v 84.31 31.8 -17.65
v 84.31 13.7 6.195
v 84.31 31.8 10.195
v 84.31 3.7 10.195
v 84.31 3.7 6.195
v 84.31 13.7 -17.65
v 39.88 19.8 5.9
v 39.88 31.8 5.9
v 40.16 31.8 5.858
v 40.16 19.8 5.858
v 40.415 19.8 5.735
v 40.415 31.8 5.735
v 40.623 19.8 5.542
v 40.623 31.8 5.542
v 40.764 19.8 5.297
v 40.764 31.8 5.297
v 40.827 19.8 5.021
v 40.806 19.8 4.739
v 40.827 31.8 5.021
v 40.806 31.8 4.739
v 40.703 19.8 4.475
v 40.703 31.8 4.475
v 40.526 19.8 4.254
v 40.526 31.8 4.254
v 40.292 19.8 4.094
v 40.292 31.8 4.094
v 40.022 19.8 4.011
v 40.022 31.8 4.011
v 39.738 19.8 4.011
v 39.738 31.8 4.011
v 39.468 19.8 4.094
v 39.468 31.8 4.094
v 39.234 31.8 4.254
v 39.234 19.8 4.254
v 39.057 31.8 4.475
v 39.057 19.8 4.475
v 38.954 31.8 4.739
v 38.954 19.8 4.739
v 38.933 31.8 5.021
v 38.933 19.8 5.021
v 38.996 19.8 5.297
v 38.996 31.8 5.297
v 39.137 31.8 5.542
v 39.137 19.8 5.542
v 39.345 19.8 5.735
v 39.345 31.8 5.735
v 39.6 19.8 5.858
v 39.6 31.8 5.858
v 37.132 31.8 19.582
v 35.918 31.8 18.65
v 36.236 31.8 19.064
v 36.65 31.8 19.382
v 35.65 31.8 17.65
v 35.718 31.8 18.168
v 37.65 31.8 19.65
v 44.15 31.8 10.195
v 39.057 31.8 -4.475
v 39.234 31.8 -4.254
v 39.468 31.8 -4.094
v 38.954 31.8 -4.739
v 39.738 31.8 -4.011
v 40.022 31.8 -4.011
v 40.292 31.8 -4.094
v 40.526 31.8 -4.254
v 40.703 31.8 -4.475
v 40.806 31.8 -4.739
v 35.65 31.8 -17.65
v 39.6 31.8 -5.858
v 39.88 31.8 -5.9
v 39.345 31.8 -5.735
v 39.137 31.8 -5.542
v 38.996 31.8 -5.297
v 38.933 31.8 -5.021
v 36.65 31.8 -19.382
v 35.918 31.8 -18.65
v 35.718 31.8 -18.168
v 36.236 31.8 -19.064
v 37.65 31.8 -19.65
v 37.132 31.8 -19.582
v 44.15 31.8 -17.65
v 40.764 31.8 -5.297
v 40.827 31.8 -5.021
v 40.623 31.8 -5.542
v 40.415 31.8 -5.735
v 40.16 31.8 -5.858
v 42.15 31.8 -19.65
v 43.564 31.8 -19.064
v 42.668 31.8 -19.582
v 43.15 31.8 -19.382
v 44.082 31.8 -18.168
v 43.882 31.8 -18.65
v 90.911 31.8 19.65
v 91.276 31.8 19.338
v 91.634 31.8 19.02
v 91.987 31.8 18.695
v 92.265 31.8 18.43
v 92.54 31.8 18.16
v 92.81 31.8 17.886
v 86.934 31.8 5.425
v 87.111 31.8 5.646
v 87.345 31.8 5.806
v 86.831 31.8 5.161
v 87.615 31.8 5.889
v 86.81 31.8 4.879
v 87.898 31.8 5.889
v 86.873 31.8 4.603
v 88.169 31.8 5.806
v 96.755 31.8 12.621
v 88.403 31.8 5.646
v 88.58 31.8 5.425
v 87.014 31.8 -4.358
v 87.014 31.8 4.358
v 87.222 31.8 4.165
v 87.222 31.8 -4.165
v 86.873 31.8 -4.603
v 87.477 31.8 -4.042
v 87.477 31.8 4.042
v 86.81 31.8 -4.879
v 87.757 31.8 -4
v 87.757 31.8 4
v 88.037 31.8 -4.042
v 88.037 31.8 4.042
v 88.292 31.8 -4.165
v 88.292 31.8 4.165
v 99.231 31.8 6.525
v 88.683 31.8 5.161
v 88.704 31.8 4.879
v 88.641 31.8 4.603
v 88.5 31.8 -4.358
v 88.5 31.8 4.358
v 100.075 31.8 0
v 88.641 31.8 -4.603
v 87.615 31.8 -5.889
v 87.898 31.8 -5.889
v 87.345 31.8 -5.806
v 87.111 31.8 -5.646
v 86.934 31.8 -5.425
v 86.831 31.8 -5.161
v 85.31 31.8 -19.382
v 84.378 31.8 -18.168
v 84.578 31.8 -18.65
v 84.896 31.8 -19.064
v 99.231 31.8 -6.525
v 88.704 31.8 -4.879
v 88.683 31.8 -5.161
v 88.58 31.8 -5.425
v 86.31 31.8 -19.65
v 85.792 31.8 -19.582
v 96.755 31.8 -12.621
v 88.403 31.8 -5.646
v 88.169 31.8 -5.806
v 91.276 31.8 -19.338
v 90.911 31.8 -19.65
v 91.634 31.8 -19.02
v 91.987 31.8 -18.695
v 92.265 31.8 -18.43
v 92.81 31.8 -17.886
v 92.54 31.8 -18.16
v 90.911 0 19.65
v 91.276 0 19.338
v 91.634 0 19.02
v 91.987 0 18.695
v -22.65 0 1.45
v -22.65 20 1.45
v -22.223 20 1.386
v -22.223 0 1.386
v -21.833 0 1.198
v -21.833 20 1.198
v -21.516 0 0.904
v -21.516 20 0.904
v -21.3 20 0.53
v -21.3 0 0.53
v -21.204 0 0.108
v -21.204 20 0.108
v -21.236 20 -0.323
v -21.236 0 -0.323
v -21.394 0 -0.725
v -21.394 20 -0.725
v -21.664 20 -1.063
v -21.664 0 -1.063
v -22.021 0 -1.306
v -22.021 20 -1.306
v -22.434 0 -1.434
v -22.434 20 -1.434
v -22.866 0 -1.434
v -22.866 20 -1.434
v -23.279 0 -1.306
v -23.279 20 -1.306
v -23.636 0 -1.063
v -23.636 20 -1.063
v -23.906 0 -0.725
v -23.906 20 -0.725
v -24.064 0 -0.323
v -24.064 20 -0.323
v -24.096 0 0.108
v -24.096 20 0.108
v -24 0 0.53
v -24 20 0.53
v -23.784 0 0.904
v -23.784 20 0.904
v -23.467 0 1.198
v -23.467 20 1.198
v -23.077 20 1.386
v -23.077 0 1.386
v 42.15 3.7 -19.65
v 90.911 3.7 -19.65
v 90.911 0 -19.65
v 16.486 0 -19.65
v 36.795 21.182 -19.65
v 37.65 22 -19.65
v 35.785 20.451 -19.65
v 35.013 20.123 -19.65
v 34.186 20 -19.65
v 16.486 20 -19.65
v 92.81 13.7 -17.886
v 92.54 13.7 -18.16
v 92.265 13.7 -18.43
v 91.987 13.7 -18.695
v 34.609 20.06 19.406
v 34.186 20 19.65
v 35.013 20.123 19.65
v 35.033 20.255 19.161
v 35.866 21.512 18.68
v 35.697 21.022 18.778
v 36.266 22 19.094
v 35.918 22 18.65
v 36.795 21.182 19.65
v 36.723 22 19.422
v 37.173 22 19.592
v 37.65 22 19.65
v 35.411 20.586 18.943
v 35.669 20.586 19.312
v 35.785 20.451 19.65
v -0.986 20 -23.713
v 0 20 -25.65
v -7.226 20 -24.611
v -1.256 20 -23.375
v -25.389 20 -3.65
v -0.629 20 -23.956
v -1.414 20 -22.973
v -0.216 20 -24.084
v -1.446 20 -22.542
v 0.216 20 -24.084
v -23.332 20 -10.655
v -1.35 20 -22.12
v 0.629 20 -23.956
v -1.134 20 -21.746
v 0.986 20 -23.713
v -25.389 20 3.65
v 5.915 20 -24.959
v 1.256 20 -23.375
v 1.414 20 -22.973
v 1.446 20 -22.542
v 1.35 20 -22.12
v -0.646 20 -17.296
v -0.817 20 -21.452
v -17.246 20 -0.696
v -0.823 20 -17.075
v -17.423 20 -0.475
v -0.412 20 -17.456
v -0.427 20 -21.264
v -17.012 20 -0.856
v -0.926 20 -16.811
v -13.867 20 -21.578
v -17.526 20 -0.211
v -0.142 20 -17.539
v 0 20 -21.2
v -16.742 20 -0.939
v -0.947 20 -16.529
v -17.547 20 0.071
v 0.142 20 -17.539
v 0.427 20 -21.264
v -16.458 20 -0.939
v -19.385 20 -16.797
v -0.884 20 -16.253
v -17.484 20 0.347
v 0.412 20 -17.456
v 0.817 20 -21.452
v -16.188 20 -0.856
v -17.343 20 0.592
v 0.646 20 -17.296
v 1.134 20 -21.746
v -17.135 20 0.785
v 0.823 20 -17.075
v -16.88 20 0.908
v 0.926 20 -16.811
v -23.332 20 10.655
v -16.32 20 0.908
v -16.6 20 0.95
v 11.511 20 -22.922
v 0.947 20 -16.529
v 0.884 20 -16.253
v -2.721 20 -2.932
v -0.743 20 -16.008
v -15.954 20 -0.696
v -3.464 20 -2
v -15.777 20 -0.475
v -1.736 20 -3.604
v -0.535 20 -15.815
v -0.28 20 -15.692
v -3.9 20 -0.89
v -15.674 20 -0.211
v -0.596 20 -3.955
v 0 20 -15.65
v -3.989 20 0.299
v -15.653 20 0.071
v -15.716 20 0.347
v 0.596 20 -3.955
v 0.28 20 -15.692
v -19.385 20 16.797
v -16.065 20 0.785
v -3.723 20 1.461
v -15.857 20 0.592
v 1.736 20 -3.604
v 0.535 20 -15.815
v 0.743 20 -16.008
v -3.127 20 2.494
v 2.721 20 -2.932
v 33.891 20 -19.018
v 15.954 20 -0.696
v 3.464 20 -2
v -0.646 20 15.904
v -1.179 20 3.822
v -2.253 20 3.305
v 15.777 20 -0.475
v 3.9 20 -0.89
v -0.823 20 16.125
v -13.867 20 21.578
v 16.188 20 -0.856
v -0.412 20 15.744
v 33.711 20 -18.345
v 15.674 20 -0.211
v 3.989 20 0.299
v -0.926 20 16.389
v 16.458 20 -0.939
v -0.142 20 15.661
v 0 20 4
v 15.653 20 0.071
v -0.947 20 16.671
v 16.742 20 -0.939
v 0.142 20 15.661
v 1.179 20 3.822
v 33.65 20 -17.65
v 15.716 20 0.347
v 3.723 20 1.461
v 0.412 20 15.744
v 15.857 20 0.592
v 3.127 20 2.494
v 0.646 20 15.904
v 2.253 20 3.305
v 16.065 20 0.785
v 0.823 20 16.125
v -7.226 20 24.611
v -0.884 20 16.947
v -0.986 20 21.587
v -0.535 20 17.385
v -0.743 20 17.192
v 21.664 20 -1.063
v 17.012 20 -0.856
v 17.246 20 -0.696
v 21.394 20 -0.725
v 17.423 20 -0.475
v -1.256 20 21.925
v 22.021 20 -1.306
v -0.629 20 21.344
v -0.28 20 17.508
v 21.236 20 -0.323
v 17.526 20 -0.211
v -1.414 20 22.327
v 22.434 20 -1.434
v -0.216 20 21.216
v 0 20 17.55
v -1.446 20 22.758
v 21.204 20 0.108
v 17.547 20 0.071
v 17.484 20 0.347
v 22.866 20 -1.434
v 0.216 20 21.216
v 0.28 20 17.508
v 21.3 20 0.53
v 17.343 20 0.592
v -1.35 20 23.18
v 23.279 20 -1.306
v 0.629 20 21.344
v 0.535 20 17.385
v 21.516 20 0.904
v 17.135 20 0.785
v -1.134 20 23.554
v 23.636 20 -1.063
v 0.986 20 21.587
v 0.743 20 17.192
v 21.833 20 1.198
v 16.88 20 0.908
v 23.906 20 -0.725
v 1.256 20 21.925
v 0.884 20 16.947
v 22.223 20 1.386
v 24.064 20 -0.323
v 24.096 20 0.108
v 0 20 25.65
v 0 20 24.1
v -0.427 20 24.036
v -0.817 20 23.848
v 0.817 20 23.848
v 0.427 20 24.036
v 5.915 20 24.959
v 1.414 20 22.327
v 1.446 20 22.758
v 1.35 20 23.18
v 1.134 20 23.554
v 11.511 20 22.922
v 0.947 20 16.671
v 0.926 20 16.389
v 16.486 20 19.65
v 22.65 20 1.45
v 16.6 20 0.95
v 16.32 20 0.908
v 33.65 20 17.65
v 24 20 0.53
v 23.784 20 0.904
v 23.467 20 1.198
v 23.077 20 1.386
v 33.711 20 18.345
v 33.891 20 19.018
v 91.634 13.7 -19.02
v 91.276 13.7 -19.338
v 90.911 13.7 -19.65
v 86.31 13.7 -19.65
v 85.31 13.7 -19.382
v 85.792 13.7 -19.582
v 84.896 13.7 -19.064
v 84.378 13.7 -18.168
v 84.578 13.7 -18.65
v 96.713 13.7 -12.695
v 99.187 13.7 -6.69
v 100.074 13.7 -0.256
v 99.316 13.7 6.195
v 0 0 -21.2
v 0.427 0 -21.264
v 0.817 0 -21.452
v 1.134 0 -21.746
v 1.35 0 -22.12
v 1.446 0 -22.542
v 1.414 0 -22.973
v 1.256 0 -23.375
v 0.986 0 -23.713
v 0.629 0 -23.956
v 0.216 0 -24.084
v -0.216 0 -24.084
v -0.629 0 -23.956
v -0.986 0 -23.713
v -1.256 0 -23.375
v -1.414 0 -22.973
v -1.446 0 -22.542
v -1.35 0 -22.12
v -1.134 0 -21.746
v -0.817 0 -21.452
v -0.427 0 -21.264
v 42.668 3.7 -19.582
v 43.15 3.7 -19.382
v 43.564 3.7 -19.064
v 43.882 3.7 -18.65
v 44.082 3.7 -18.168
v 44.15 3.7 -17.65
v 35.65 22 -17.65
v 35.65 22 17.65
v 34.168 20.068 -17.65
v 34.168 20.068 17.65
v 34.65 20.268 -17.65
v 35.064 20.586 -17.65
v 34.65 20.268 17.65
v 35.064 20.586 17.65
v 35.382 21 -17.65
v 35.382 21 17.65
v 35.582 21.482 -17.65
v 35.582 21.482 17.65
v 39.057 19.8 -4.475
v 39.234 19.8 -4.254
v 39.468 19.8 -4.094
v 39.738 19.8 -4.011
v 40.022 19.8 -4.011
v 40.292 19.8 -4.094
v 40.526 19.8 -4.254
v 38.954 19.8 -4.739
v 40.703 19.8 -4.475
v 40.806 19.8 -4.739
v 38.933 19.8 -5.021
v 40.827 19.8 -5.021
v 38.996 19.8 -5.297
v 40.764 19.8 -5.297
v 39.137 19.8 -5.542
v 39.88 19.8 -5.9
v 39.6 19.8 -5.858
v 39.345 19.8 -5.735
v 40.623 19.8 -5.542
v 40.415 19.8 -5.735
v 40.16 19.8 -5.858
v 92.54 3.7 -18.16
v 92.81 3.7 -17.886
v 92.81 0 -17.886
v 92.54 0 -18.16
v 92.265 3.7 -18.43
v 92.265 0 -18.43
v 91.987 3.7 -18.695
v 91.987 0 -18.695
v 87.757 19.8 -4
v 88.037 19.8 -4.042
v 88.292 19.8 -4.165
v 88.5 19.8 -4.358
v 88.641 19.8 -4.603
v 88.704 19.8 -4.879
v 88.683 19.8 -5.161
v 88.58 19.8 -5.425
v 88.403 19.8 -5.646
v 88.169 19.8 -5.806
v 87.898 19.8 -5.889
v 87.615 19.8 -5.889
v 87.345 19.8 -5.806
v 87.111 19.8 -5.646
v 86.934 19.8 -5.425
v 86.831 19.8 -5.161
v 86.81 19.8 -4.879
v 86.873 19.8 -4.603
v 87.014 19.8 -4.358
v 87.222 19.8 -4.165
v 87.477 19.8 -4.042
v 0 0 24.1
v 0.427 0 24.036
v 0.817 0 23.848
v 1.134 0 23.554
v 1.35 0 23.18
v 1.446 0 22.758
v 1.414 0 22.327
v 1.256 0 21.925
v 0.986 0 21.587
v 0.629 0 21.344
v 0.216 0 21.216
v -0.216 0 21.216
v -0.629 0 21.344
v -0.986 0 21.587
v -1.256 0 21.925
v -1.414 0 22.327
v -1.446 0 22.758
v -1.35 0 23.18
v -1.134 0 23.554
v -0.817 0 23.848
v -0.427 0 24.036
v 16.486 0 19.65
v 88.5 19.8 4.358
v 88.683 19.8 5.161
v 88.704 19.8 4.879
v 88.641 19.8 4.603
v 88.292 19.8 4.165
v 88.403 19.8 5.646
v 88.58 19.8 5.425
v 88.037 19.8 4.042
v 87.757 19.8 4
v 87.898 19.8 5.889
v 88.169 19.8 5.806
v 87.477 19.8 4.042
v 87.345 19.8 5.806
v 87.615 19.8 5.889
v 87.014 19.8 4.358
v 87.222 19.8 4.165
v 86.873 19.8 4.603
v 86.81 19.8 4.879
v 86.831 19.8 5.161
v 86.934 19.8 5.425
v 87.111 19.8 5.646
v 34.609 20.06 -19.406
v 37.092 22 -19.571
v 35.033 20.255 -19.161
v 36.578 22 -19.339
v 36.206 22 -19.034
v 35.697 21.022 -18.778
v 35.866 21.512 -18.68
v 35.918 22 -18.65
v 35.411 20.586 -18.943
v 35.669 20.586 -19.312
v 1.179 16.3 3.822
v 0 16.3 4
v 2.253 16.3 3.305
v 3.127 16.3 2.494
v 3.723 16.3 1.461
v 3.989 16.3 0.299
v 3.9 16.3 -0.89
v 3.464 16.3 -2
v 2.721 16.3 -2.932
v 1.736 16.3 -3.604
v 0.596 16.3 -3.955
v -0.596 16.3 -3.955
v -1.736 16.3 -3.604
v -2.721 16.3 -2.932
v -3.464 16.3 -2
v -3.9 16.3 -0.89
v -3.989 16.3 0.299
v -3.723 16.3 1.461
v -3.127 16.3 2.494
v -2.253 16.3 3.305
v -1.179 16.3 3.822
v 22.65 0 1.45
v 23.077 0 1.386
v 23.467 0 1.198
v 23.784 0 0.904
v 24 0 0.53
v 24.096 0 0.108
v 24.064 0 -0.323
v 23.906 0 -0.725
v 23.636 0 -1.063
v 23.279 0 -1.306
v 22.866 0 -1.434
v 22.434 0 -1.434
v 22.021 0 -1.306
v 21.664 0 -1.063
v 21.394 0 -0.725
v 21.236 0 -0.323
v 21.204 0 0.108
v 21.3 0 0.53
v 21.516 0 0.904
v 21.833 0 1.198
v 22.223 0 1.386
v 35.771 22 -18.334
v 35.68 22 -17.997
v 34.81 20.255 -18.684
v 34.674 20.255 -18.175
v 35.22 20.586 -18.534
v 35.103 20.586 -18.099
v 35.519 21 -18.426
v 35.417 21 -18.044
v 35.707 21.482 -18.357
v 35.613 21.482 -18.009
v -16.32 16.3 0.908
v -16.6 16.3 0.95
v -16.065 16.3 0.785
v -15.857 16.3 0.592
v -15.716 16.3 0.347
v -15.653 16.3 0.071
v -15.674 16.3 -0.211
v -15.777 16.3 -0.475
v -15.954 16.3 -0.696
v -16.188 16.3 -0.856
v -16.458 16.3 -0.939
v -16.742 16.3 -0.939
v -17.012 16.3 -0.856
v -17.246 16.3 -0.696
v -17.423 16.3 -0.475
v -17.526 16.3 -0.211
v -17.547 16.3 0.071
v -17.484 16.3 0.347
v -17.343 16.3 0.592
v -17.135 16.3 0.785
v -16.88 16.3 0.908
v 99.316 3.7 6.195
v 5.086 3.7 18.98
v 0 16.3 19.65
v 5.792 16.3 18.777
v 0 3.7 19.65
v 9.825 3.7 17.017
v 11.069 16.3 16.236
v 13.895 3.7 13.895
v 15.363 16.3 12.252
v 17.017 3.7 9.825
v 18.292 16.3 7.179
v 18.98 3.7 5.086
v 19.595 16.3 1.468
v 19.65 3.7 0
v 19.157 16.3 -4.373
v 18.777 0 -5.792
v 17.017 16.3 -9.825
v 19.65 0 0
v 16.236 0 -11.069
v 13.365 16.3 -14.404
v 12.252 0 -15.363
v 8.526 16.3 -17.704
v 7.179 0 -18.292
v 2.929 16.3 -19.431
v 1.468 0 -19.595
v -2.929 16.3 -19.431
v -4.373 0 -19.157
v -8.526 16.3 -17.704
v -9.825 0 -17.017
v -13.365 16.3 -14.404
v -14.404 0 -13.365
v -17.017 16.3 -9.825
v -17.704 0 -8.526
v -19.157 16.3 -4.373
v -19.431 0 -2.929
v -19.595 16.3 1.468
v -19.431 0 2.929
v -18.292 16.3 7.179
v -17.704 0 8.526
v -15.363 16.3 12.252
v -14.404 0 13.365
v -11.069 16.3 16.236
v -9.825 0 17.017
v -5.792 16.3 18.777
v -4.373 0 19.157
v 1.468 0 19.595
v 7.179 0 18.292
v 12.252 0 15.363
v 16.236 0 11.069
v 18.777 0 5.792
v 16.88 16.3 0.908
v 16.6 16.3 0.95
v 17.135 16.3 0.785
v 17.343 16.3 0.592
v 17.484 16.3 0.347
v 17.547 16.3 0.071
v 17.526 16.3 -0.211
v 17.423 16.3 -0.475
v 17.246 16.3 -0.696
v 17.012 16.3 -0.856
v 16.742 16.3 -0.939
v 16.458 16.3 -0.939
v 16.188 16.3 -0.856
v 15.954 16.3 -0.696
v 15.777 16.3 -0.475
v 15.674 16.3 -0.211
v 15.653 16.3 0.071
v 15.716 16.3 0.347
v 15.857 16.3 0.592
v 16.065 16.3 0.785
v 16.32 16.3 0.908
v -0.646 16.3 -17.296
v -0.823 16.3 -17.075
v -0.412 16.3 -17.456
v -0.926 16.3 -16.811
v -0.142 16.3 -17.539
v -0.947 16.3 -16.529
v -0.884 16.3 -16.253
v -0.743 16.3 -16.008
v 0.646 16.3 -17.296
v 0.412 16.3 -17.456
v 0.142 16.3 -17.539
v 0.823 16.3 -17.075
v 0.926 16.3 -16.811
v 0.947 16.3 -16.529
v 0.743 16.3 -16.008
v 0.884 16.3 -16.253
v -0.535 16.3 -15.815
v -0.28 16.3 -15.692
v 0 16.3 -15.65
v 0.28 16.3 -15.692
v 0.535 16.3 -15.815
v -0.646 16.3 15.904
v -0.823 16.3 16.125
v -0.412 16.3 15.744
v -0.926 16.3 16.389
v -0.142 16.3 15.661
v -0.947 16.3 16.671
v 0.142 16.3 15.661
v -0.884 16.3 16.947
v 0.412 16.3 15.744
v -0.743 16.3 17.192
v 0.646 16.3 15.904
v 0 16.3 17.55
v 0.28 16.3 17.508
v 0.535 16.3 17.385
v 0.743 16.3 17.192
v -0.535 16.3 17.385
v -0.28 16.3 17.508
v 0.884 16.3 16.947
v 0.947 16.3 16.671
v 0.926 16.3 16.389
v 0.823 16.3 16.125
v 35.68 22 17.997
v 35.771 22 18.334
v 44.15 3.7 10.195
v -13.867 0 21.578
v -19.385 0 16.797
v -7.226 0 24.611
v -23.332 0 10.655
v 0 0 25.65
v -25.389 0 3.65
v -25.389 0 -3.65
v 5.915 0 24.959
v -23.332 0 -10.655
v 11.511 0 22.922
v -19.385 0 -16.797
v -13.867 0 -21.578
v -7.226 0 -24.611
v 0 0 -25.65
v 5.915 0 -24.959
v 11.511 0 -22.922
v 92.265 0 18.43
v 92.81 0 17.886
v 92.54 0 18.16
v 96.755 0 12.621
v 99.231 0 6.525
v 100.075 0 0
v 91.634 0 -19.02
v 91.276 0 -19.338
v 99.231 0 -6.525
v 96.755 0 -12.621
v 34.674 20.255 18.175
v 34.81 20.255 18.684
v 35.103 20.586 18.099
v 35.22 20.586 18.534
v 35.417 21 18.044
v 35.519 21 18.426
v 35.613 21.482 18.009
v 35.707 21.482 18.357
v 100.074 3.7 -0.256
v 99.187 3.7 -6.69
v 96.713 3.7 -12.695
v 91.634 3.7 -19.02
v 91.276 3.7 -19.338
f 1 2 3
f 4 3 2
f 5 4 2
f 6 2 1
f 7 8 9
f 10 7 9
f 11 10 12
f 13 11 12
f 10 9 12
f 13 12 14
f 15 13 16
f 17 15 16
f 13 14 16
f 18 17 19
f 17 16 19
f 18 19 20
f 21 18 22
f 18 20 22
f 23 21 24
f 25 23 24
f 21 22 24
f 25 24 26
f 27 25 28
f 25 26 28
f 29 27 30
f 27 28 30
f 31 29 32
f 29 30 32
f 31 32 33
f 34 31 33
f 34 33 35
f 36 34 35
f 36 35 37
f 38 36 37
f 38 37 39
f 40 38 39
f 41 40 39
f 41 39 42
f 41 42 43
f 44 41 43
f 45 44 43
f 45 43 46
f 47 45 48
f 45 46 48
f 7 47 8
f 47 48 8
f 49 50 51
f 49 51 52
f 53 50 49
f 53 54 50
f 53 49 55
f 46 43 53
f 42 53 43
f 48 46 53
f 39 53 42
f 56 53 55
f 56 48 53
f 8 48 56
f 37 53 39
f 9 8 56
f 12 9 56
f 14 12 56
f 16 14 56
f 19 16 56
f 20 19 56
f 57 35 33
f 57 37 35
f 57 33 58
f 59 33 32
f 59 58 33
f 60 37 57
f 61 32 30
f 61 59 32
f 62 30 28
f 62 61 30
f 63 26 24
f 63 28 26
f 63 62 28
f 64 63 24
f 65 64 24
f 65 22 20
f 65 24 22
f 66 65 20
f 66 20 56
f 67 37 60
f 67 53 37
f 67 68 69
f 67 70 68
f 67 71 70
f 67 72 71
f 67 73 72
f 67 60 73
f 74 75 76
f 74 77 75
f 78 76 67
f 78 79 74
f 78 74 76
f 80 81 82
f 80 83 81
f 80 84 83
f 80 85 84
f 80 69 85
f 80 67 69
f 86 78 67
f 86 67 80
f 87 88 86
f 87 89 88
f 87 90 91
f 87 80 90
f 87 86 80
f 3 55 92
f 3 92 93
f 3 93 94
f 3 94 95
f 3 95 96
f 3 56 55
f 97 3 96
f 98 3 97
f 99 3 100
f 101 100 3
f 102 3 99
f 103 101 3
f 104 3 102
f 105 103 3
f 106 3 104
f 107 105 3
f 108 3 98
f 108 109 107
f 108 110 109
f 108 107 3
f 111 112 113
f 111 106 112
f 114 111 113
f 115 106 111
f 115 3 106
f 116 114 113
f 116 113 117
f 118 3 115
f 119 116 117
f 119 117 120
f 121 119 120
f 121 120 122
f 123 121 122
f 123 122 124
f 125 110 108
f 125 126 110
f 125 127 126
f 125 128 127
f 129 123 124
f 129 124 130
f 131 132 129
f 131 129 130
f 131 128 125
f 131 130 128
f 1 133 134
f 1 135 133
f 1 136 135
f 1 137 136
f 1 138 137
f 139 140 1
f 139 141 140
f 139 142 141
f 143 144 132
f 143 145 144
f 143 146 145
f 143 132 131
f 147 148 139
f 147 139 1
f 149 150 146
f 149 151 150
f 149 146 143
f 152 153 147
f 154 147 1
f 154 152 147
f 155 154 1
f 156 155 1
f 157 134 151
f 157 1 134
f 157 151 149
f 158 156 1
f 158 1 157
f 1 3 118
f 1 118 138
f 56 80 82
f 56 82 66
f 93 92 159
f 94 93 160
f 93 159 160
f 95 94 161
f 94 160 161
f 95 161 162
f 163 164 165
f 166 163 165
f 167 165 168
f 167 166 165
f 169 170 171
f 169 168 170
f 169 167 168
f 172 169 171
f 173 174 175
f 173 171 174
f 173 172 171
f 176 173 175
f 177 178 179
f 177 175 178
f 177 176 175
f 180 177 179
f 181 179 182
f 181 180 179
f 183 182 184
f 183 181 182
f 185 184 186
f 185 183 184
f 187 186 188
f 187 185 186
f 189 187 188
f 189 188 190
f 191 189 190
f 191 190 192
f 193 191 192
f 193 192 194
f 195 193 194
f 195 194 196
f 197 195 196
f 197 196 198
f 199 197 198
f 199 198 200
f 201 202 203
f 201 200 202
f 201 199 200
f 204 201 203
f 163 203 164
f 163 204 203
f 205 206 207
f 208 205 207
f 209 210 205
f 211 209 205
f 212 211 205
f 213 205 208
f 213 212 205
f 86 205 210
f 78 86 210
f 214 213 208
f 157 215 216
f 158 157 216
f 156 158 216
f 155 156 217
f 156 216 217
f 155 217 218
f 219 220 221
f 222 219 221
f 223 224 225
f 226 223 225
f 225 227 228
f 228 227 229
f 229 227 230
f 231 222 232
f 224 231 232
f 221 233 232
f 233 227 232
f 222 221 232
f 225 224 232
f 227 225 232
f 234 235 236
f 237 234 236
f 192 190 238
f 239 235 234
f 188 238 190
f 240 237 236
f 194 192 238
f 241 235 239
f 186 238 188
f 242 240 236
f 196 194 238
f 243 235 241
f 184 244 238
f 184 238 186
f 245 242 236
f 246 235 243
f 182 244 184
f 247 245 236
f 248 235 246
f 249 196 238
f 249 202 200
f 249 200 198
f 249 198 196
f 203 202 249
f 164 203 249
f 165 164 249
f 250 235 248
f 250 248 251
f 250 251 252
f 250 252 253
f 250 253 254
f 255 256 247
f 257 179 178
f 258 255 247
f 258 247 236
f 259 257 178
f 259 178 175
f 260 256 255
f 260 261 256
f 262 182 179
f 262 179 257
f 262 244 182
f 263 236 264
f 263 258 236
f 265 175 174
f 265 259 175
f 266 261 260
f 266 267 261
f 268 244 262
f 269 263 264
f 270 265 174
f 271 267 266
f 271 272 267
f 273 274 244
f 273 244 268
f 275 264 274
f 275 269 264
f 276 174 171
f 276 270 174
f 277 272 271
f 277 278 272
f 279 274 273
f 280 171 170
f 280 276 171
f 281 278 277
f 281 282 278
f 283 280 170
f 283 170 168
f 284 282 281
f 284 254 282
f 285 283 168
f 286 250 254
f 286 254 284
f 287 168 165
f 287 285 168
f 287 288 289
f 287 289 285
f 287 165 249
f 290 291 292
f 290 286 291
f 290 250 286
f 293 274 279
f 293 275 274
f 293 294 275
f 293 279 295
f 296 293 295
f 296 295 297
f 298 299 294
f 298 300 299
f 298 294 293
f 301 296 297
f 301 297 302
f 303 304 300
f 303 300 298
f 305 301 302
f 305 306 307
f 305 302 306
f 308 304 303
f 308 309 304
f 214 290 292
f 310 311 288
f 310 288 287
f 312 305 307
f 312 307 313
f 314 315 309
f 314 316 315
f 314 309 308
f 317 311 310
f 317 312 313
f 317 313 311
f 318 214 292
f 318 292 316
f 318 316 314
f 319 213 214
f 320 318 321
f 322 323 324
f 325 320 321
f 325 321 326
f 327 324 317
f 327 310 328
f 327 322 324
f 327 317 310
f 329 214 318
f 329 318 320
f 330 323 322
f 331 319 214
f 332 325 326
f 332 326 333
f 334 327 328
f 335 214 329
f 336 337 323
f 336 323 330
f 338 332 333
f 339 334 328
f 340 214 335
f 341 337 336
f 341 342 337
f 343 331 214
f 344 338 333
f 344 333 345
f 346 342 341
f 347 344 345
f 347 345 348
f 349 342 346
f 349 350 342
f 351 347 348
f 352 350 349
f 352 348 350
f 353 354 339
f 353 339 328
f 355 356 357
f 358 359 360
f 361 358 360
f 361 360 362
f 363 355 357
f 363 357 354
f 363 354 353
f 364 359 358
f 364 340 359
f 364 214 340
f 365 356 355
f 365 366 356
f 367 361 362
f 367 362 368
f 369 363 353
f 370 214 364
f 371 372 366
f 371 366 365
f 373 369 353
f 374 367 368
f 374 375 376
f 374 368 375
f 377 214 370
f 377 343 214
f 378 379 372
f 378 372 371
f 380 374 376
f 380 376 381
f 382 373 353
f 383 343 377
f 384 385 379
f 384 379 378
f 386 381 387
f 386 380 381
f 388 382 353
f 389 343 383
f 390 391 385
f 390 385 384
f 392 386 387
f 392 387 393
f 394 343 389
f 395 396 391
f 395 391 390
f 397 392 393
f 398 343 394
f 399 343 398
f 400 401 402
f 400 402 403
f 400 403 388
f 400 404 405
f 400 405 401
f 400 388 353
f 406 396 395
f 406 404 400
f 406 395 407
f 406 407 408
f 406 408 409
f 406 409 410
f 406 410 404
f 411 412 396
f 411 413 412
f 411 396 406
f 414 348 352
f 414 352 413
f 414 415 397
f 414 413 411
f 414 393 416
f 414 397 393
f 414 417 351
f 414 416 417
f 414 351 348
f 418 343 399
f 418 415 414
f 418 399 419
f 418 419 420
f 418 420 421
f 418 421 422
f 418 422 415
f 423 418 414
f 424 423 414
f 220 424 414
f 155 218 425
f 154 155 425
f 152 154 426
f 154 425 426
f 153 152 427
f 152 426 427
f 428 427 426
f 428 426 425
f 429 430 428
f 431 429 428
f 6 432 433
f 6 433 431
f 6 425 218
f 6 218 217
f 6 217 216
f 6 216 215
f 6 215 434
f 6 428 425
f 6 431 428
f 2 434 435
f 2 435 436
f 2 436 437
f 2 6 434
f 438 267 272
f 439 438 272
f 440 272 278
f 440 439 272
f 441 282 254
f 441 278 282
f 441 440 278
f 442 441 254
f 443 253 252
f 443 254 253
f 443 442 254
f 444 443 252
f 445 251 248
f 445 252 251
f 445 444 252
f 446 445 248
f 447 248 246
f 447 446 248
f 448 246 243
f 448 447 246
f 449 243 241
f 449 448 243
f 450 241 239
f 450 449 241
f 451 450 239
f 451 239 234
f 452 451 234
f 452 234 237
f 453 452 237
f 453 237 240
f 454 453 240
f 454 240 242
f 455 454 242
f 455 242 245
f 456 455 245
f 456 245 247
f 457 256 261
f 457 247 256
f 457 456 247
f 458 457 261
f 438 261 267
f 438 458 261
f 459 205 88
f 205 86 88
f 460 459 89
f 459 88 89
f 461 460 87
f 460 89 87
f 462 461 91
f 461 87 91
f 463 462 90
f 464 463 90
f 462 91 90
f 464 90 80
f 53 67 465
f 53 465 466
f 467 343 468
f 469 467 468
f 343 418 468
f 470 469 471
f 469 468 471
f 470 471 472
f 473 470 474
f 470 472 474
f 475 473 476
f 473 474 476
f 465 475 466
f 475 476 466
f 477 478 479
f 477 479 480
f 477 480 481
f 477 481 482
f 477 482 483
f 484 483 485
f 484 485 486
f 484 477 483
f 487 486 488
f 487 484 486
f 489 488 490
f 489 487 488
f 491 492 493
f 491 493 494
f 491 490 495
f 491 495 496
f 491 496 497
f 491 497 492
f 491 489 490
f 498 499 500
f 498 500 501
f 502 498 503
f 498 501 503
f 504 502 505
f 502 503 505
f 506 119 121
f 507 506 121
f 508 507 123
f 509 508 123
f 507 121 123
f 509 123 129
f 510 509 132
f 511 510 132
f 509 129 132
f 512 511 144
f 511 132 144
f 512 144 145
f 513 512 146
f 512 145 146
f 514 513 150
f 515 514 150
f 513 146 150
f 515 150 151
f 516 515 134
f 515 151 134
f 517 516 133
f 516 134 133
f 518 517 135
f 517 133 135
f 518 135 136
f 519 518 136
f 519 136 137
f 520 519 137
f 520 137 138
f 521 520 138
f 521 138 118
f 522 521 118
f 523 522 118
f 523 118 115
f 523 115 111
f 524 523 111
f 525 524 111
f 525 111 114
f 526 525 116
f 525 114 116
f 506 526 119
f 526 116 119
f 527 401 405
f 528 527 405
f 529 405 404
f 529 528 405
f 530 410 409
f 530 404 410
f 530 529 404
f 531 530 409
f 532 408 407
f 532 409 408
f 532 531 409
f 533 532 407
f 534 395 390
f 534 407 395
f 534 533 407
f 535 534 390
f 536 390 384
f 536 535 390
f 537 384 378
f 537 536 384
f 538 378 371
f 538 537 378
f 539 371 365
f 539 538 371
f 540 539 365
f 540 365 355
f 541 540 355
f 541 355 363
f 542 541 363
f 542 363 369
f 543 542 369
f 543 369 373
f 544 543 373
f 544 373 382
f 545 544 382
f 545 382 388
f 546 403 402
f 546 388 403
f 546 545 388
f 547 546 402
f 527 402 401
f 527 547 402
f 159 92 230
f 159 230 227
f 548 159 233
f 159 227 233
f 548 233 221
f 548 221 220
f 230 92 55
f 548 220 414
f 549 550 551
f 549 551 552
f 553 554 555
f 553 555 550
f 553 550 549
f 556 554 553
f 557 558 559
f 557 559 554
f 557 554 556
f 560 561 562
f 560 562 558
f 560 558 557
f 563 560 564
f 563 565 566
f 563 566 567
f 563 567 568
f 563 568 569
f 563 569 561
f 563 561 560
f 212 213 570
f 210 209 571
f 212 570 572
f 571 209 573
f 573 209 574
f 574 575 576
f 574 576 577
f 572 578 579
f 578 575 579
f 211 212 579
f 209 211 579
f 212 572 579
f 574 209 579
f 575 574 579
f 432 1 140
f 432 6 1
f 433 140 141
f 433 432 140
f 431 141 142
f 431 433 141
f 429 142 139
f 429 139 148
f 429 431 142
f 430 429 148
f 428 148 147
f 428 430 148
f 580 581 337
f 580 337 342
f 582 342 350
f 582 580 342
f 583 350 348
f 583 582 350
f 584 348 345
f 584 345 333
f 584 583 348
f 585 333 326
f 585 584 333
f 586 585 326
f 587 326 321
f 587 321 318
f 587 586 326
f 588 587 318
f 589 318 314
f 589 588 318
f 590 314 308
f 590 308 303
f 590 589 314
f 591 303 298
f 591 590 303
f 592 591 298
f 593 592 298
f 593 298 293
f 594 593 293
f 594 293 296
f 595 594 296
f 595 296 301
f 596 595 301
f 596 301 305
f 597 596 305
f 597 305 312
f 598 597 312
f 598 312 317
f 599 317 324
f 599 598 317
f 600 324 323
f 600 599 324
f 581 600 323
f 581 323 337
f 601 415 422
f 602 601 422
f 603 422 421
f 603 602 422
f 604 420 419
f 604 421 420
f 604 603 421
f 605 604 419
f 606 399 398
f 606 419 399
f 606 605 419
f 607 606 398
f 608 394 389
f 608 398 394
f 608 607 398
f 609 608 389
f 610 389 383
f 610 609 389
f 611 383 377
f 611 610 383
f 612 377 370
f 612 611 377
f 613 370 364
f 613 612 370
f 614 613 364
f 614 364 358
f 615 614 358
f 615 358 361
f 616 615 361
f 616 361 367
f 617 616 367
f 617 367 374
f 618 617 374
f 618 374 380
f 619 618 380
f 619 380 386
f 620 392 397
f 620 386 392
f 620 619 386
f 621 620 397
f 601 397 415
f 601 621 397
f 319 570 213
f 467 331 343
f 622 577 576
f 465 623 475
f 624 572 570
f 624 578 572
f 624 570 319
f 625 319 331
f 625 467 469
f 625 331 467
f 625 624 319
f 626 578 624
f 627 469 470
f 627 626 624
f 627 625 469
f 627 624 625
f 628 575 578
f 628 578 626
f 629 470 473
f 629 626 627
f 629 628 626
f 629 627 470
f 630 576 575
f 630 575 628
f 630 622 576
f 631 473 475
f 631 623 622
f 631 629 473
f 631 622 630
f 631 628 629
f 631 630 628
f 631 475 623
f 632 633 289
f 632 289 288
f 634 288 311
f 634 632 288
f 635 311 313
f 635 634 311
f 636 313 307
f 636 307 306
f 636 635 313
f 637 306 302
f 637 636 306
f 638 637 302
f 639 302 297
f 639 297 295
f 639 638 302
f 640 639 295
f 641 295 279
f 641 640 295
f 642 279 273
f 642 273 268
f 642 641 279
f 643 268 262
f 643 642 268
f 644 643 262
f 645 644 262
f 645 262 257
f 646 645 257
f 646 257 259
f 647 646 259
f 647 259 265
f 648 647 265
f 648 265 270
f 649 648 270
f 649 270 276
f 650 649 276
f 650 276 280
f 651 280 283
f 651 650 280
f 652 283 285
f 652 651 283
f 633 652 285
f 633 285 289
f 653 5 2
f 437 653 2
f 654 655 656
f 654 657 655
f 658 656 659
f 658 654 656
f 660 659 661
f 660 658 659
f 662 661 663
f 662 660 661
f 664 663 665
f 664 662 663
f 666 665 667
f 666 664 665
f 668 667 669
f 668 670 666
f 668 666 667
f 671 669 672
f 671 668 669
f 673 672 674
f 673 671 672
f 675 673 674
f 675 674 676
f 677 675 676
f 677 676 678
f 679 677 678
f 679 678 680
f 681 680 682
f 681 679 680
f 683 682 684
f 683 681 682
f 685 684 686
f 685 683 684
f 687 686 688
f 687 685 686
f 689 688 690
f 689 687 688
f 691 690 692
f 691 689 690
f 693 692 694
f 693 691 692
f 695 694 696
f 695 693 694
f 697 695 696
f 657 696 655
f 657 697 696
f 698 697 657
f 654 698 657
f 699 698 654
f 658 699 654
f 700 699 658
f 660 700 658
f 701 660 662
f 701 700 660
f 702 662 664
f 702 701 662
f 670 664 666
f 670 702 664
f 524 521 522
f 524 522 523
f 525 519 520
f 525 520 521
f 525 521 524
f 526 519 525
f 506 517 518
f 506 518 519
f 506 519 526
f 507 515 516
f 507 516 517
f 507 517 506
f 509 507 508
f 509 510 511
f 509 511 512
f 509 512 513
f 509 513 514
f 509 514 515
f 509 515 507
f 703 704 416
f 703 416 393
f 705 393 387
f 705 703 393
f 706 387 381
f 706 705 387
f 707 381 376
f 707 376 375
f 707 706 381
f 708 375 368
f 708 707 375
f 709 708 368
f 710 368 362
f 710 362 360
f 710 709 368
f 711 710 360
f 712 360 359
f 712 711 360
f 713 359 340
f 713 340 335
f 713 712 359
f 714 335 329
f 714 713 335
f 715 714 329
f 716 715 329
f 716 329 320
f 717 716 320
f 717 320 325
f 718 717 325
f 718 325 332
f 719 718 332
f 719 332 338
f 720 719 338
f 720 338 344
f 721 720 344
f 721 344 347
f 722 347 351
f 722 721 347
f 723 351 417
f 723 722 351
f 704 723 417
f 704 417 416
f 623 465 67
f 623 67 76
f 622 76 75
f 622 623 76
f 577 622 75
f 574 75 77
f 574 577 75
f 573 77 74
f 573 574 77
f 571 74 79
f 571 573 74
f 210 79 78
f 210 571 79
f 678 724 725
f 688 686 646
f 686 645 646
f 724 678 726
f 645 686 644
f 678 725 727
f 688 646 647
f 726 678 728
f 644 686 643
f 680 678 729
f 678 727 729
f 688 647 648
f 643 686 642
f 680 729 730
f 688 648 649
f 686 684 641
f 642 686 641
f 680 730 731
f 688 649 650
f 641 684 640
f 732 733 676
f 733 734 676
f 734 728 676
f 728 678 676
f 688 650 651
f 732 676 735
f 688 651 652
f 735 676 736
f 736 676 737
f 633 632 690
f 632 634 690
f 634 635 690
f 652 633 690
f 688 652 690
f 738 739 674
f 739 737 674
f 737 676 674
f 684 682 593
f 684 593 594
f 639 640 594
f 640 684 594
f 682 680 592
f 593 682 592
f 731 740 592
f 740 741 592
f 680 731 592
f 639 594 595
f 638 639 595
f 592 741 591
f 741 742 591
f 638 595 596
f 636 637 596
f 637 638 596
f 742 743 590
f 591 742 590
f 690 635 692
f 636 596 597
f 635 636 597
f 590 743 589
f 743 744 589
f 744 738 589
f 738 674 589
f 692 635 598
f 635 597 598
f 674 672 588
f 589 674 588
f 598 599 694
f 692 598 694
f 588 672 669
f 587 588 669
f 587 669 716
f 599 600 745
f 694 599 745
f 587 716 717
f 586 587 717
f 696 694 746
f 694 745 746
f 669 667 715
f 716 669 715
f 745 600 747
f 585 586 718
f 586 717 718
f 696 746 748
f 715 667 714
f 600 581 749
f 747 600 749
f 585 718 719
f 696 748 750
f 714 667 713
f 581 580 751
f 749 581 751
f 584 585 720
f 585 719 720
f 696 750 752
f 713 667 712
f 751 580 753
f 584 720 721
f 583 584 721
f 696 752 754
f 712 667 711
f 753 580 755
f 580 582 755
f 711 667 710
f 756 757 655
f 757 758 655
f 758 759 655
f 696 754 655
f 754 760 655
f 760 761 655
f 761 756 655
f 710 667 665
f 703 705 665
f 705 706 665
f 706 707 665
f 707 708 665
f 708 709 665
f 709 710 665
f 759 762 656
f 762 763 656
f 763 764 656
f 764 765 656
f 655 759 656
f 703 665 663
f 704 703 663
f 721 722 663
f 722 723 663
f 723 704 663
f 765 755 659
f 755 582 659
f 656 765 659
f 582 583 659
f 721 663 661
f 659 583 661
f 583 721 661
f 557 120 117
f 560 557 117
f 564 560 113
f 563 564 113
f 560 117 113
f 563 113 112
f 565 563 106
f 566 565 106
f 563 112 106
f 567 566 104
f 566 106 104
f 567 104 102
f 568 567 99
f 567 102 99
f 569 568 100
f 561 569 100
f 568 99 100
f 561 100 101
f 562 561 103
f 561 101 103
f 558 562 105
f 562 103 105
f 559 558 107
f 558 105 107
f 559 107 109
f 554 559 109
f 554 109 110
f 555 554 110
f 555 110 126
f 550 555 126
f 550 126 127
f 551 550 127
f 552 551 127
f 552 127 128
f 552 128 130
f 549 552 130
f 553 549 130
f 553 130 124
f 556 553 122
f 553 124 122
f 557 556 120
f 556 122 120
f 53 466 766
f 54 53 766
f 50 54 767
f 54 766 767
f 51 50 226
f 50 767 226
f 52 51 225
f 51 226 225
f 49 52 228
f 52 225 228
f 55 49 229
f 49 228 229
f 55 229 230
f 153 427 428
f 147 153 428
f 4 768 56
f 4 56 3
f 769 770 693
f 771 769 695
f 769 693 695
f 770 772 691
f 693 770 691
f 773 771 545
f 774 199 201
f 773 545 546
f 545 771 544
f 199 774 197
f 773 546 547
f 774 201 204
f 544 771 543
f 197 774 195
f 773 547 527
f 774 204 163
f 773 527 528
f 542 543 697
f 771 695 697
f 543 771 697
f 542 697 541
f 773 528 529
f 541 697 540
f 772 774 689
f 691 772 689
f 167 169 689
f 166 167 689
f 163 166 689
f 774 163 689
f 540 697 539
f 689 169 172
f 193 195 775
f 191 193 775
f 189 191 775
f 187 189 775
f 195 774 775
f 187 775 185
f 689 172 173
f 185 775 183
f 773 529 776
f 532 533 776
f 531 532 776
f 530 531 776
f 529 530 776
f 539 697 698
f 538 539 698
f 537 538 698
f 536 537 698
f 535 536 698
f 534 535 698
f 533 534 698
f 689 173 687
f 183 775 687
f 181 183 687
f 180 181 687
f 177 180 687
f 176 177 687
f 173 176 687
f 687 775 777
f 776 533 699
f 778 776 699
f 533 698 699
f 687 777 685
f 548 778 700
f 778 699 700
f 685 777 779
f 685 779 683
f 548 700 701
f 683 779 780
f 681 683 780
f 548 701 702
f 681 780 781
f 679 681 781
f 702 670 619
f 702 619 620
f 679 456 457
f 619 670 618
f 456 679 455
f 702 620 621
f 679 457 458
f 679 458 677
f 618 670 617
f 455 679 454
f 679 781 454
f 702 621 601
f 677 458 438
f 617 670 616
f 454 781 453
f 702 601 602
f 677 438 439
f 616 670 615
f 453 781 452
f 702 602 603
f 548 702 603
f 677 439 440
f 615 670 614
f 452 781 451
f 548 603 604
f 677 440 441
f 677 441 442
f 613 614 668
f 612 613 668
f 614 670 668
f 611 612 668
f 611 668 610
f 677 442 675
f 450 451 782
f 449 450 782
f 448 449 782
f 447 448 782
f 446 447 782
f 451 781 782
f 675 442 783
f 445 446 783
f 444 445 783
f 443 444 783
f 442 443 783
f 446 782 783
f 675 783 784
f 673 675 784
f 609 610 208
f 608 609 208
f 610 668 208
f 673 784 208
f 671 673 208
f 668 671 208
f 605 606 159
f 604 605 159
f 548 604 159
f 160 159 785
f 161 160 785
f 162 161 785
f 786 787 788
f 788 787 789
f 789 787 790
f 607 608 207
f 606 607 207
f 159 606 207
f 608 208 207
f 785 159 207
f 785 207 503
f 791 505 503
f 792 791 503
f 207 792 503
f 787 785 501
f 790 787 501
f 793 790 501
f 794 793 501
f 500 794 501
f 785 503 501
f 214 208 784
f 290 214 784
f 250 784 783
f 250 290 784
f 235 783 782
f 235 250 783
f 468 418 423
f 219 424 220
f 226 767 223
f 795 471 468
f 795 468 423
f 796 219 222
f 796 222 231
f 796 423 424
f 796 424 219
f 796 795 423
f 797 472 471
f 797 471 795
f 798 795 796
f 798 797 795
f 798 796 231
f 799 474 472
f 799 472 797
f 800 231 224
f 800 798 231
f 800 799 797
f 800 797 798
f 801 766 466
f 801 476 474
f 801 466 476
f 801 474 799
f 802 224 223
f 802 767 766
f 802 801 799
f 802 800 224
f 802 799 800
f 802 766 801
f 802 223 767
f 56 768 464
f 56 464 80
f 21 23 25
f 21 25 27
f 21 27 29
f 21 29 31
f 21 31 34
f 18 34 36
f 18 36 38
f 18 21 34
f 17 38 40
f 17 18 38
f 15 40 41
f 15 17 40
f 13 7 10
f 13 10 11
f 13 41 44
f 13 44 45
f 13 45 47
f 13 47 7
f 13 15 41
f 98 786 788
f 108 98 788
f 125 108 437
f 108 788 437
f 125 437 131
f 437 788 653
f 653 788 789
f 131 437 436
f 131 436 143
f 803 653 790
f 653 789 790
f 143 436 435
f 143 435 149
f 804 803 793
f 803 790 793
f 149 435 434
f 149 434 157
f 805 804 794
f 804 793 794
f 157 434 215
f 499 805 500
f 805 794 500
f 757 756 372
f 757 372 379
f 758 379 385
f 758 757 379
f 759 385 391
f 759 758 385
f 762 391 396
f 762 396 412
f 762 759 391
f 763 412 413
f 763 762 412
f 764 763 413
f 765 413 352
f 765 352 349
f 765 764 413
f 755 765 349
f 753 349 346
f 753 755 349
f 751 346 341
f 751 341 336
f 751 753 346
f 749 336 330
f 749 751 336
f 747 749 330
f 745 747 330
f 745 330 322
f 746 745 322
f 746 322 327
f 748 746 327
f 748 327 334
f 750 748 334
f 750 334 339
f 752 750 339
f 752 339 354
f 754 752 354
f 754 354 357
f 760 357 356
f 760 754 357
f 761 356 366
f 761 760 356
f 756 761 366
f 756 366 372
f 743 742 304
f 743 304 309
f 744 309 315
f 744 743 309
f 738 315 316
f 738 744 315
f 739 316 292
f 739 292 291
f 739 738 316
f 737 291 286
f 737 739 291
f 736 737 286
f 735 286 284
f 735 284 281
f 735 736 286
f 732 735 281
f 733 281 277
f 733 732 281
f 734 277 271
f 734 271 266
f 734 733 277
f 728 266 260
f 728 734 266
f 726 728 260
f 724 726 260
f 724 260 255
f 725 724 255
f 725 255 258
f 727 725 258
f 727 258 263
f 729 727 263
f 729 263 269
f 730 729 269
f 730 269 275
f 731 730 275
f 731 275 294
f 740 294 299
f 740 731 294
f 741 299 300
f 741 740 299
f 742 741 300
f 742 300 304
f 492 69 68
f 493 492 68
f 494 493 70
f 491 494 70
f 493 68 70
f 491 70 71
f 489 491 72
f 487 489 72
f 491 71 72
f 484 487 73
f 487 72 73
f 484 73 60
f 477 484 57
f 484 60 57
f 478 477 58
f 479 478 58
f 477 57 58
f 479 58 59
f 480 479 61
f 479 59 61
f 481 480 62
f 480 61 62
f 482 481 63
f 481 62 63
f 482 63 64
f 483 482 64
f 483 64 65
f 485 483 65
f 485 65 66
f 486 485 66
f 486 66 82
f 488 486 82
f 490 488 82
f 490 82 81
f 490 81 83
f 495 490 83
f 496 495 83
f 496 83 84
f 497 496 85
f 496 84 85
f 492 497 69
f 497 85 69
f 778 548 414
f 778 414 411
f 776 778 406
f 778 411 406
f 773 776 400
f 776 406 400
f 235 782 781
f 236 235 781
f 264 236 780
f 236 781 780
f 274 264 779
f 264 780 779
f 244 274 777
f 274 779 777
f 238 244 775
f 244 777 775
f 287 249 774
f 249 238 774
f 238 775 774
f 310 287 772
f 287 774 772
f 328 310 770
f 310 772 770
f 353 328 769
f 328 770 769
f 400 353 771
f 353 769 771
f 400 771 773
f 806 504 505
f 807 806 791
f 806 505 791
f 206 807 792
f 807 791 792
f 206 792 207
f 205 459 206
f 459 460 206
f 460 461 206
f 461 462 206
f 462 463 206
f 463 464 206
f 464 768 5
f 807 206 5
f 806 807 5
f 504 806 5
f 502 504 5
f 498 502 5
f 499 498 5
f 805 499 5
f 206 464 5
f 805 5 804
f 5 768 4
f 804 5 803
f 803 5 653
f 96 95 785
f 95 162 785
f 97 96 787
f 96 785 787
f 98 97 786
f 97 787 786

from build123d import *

# Parameters (mm, degrees)
SKETCH1_R                = 25.65
SKETCH1_R_2              = 19.65
SKETCH1_R_3              = 4
SKETCH1_R_4              = 0.95
SKETCH1_W                = 40.16
SKETCH1_H                = 20.39
BOSS_EXTRUDE2_DEPTH      = 3.7
SKETCH5_R                = 19.65
SKETCH5_W                = 40.16
SKETCH5_H                = 20.39
BOSS_EXTRUDE3_DEPTH      = 28.1
CUT_EXTRUDE1_REACH       = 112.955
SKETCH6_W                = 40.16
SKETCH6_H                = 28.1
CUT_EXTRUDE2_REACH       = 119.305
CUT_EXTRUDE2_END_RADIUS  = 25.65
SKETCH7_W                = 29.863740461
SKETCH7_H                = 10
CUT_EXTRUDE3_DEPTH       = 109.093330622
CUT_EXTRUDE3_DEPTH_BACK  = 109.093330622
SKETCH8_R                = 1.45
SKETCH9_R                = 0.95
CUT_EXTRUDE4_DEPTH       = 12
CUT_EXTRUDE5_DEPTH       = 109.093330622
FILLET1_R                = 2
CUT_EXTRUDE6_DEPTH       = 11.8
BOSS_EXTRUDE4_START      = -3.7
SKETCH14_R               = 19.65
SKETCH14_R_2             = 0.95
SKETCH14_R_3             = 4
BOSS_EXTRUDE4_DEPTH      = 3.7
CUT_EXTRUDE7_START       = -3.7
CUT_EXTRUDE7_OUTLINE_R   = 19.65
CUT_EXTRUDE7_OUTLINE_R_2 = 0.95
CUT_EXTRUDE7_OUTLINE_R_3 = 4
CUT_EXTRUDE7_DEPTH       = 3.7
FILLET2_R                = 2
FILLET3_R                = 2


# Read off the part's stored shape, not the designer's step: Cut-Extrude7
with BuildPart() as part:
    # Sketch1 → Boss-Extrude2 (new body)
    # profile 1 of 6: a face of its own
    with BuildSketch(Plane(origin=(0, 0, 0), x_dir=(1, 0, 0), z_dir=(0, 1, 0))):
        Circle(SKETCH1_R)
        Circle(SKETCH1_R_2, mode=Mode.SUBTRACT)
    # profile 2 of 6: a face of its own
    with BuildSketch(Plane(origin=(0, 0, 0), x_dir=(1, 0, 0), z_dir=(0, 1, 0))):
        Circle(SKETCH1_R_2)
        with Locations(Location((0, 0, 0), (0, 0, 270))):
            Circle(SKETCH1_R_3, mode=Mode.SUBTRACT)
        with Locations(Location((16.6, 0, 0), (0, 0, 270))):
            Circle(SKETCH1_R_4, mode=Mode.SUBTRACT)
        with Locations(Location((0, -16.6, 0), (0, 0, 270))):
            Circle(SKETCH1_R_4, mode=Mode.SUBTRACT)
        with Locations(Location((-16.6, 0, 0), (0, 0, 270))):
            Circle(SKETCH1_R_4, mode=Mode.SUBTRACT)
        with Locations(Location((0, 16.6, 0), (0, 0, 270))):
            Circle(SKETCH1_R_4, mode=Mode.SUBTRACT)
    # profile 3 of 6: a face of its own
    with BuildSketch(Plane(origin=(0, 0, 0), x_dir=(1, 0, 0), z_dir=(0, 1, 0))):
        with BuildLine():
            Line((35.65, 18.695), (91.986875612, 18.695))
            ThreePointArc((91.986875612, 18.695), (83.869462663, 23.847948025), (74.425, 25.65))
            Line((74.425, 25.65), (0, 25.65))
            ThreePointArc((0, 25.65), (18.137288937, 18.137288937), (25.65, 0))
            ThreePointArc((25.65, 0), (18.137288937, -18.137288937), (0, -25.65))
            Line((0, -25.65), (74.425, -25.65))
            ThreePointArc((74.425, -25.65), (83.869462663, -23.847948025), (91.986875612, -18.695))
            Line((91.986875612, -18.695), (35.65, -18.695))
            Line((35.65, -18.695), (35.65, 18.695))
        make_face()
    # profile 4 of 6: a face of its own
    with BuildSketch(Plane(origin=(0, 0, 0), x_dir=(1, 0, 0), z_dir=(0, 1, 0))):
        with BuildLine():
            Line((92.81, -17.886147573), (92.81, 17.886147573))
            ThreePointArc((92.81, 17.886147573), (92.402987293, 18.295203548), (91.986875612, 18.695))
            Line((91.986875612, 18.695), (35.65, 18.695))
            Line((35.65, 18.695), (35.65, -18.695))
            Line((35.65, -18.695), (91.986875612, -18.695))
            ThreePointArc((91.986875612, -18.695), (92.402987293, -18.295203548), (92.81, -17.886147573))
        make_face()
        with Locations((64.23, 0)):
            Rectangle(SKETCH1_W, SKETCH1_H, mode=Mode.SUBTRACT)
    # profile 5 of 6: a face of its own
    with BuildSketch(Plane(origin=(0, 0, 0), x_dir=(1, 0, 0), z_dir=(0, 1, 0))):
        with Locations((64.23, 0)):
            Rectangle(SKETCH1_W, SKETCH1_H)
    # profile 6 of 6: a face of its own
    with BuildSketch(Plane(origin=(0, 0, 0), x_dir=(1, 0, 0), z_dir=(0, 1, 0))):
        with BuildLine():
            ThreePointArc((92.81, -17.886147573), (100.075, 0), (92.81, 17.886147573))
            Line((92.81, 17.886147573), (92.81, -17.886147573))
        make_face()
    extrude(amount=BOSS_EXTRUDE2_DEPTH)

    # Sketch5 → Boss-Extrude3 (add)
    # profile 1 of 4: a face of its own
    with BuildSketch(Plane(origin=(0, 3.7, 0), x_dir=(1, 0, 0), z_dir=(0, 1, 0))):
        with BuildLine():
            ThreePointArc((25.65, 0), (18.137288937, 18.137288937), (0, 25.65))
            ThreePointArc((0, 25.65), (-25.65, 0), (0, -25.65))
            ThreePointArc((0, -25.65), (18.137288937, -18.137288937), (25.65, 0))
        make_face()
        with Locations(Location((0, 0, 0), (0, 0, 270))):
            Circle(SKETCH5_R, mode=Mode.SUBTRACT)
    # profile 2 of 4: a face of its own
    with BuildSketch(Plane(origin=(0, 3.7, 0), x_dir=(1, 0, 0), z_dir=(0, 1, 0))):
        with BuildLine():
            ThreePointArc((92.81, 17.886147573), (92.402987293, 18.295203548), (91.986875612, 18.695))
            Line((91.986875612, 18.695), (35.65, 18.695))
            Line((35.65, 18.695), (35.65, -18.695))
            Line((35.65, -18.695), (91.986875612, -18.695))
            ThreePointArc((91.986875612, -18.695), (92.402987293, -18.295203548), (92.81, -17.886147573))
            Line((92.81, -17.886147573), (92.81, 17.886147573))
        make_face()
        with Locations((64.23, 0)):
            Rectangle(SKETCH5_W, SKETCH5_H, mode=Mode.SUBTRACT)
    # profile 3 of 4: a face of its own
    with BuildSketch(Plane(origin=(0, 3.7, 0), x_dir=(1, 0, 0), z_dir=(0, 1, 0))):
        with BuildLine():
            ThreePointArc((91.986875612, 18.695), (83.869462663, 23.847948025), (74.425, 25.65))
            Line((74.425, 25.65), (0, 25.65))
            ThreePointArc((0, 25.65), (18.137288937, 18.137288937), (25.65, 0))
            ThreePointArc((25.65, 0), (18.137288937, -18.137288937), (0, -25.65))
            Line((0, -25.65), (74.425, -25.65))
            ThreePointArc((74.425, -25.65), (83.869462663, -23.847948025), (91.986875612, -18.695))
            Line((91.986875612, -18.695), (35.65, -18.695))
            Line((35.65, -18.695), (35.65, 18.695))
            Line((35.65, 18.695), (91.986875612, 18.695))
        make_face()
    # profile 4 of 4: a face of its own
    with BuildSketch(Plane(origin=(0, 3.7, 0), x_dir=(1, 0, 0), z_dir=(0, 1, 0))):
        with BuildLine():
            ThreePointArc((92.81, -17.886147573), (100.075, 0), (92.81, 17.886147573))
            Line((92.81, 17.886147573), (92.81, -17.886147573))
        make_face()
    extrude(amount=BOSS_EXTRUDE3_DEPTH)

    # Sketch6 → Cut-Extrude1 (cut, up to next)
    with BuildSketch(Plane.XY.offset(-10.195), mode=Mode.PRIVATE) as cut_extrude1_sk1:
        with Locations((64.23, 17.75)):
            Rectangle(SKETCH6_W, SKETCH6_H)
    cut_extrude1_tool1 = extrude(cut_extrude1_sk1.sketch, amount=-CUT_EXTRUDE1_REACH, mode=Mode.PRIVATE) & part.part
    add(cut_extrude1_tool1.solids().sort_by_distance((64.23, 17.75, -10.195))[0], mode=Mode.SUBTRACT)

    # Cut-Extrude2: up to this cylinder (the profile starts inside it)
    cut_extrude2_end = Plane(origin=(74.425, 8.7, 0), z_dir=(0, -1, 0)) * Cylinder(CUT_EXTRUDE2_END_RADIUS, 290.91, mode=Mode.PRIVATE)
    # Sketch7 → Cut-Extrude2 (cut, up to the surface)
    with BuildSketch(Plane.ZY.offset(-84.31), mode=Mode.PRIVATE) as cut_extrude2_sk1:
        with Locations((-8.736870231, 8.7)):
            Rectangle(SKETCH7_W, SKETCH7_H)
    cut_extrude2_tool1 = extrude(cut_extrude2_sk1.sketch, amount=-CUT_EXTRUDE2_REACH, mode=Mode.PRIVATE) & cut_extrude2_end
    add(cut_extrude2_tool1.solids().sort_by_distance((84.31, 8.7, -8.73687))[0], mode=Mode.SUBTRACT)

    # Sketch8 → Cut-Extrude3 (cut, two sides: drawn at the far end of the back side and taken through both)
    with BuildSketch(Plane(origin=(0, 31.8, 0), x_dir=(1, 0, 0), z_dir=(0, 1, 0)).offset(-CUT_EXTRUDE3_DEPTH_BACK)):
        with Locations(Location((22.65, 0, 0), (0, 0, 270))):
            Circle(SKETCH8_R)
        with Locations(Location((0, -22.65, 0), (0, 0, 270))):
            Circle(SKETCH8_R)
        with Locations(Location((-22.65, 0, 0), (0, 0, 270))):
            Circle(SKETCH8_R)
        with Locations(Location((0, 22.65, 0), (0, 0, 270))):
            Circle(SKETCH8_R)
    extrude(amount=CUT_EXTRUDE3_DEPTH + CUT_EXTRUDE3_DEPTH_BACK, mode=Mode.SUBTRACT)

    # Sketch9 → Cut-Extrude4 (cut)
    with BuildSketch(Plane(origin=(0, 31.8, 0), x_dir=(1, 0, 0), z_dir=(0, 1, 0))):
        with Locations(Location((39.88, -4.95, 0), (0, 0, 270))):
            Circle(SKETCH9_R)
        with Locations(Location((39.88, 4.95, 0), (0, 0, 90))):
            Circle(SKETCH9_R)
        with Locations(Location((87.756875612, -4.95, 0), (0, 0, 90))):
            Circle(SKETCH9_R)
        with Locations(Location((87.756875612, 4.95, 0), (0, 0, 270))):
            Circle(SKETCH9_R)
    extrude(amount=-CUT_EXTRUDE4_DEPTH, mode=Mode.SUBTRACT)

    # Sketch12 → Cut-Extrude5 (cut, through all)
    with BuildSketch(Plane(origin=(0, 31.8, 0), x_dir=(1, 0, 0), z_dir=(0, 1, 0))):
        with BuildLine():
            Line((0, 25.65), (74.425, 25.65))
            ThreePointArc((74.425, 25.65), (83.19711491, 24.103371134), (90.911357997, 19.65))
            Line((90.911357997, 19.65), (16.486357997, 19.65))
            ThreePointArc((16.486357997, 19.65), (8.77211491, 24.103371134), (0, 25.65))
        make_face()
        with BuildLine():
            Line((0, -25.65), (74.425, -25.65))
            ThreePointArc((74.425, -25.65), (83.19711491, -24.103371134), (90.911357997, -19.65))
            Line((90.911357997, -19.65), (16.486357997, -19.65))
            ThreePointArc((16.486357997, -19.65), (8.77211491, -24.103371134), (0, -25.65))
        make_face()
    extrude(amount=-CUT_EXTRUDE5_DEPTH, mode=Mode.SUBTRACT)

    # Fillet1
    fillet1_edges = [part.edges().sort_by_distance(p)[0] for p in [
        (44.15, 17.75, -19.65),
        (84.31, 22.75, -19.65),
    ]]
    fillet(fillet1_edges, radius=FILLET1_R)

    # Sketch13 → Cut-Extrude6 (cut)
    with BuildSketch(Plane(origin=(0, 31.8, 0), x_dir=(1, 0, 0), z_dir=(0, 1, 0))):
        with BuildLine():
            Line((35.65, 19.65), (35.65, -19.65))
            Line((35.65, -19.65), (16.486357997, -19.65))
            ThreePointArc((16.486357997, -19.65), (-25.65, 0), (16.486357997, 19.65))
            Line((16.486357997, 19.65), (35.65, 19.65))
        make_face()
    extrude(amount=-CUT_EXTRUDE6_DEPTH, mode=Mode.SUBTRACT)

    # Sketch14 → Boss-Extrude4 (add)
    with BuildSketch(Plane(origin=(0, 20, 0), x_dir=(1, 0, 0), z_dir=(0, 1, 0)).offset(BOSS_EXTRUDE4_START)):
        with Locations(Location((0, 0, 0), (0, 0, 270))):
            Circle(SKETCH14_R)
        with Locations(Location((16.6, 0, 0), (0, 0, 270))):
            Circle(SKETCH14_R_2, mode=Mode.SUBTRACT)
        with Locations(Location((0, -16.6, 0), (0, 0, 270))):
            Circle(SKETCH14_R_2, mode=Mode.SUBTRACT)
        with Locations(Location((-16.6, 0, 0), (0, 0, 270))):
            Circle(SKETCH14_R_2, mode=Mode.SUBTRACT)
        with Locations(Location((0, 16.6, 0), (0, 0, 270))):
            Circle(SKETCH14_R_2, mode=Mode.SUBTRACT)
        with Locations(Location((0, 0, 0), (0, 0, 270))):
            Circle(SKETCH14_R_3, mode=Mode.SUBTRACT)
    extrude(amount=BOSS_EXTRUDE4_DEPTH)

    # Cut-Extrude7 outline → Cut-Extrude7 (cut)
    with BuildSketch(Plane.XZ.offset(CUT_EXTRUDE7_START)):
        Circle(CUT_EXTRUDE7_OUTLINE_R)
        with Locations((0, -16.6)):
            Circle(CUT_EXTRUDE7_OUTLINE_R_2, mode=Mode.SUBTRACT)
        with Locations((-16.6, 0)):
            Circle(CUT_EXTRUDE7_OUTLINE_R_2, mode=Mode.SUBTRACT)
        Circle(CUT_EXTRUDE7_OUTLINE_R_3, mode=Mode.SUBTRACT)
        with Locations((16.6, 0)):
            Circle(CUT_EXTRUDE7_OUTLINE_R_2, mode=Mode.SUBTRACT)
        with Locations((0, 16.6)):
            Circle(CUT_EXTRUDE7_OUTLINE_R_2, mode=Mode.SUBTRACT)
    extrude(amount=CUT_EXTRUDE7_DEPTH, mode=Mode.SUBTRACT)

    # Fillet2
    fillet2_edges = [part.edges().sort_by_distance(p)[0] for p in [
        (35.65, 25.9, -19.65),
        (35.65, 25.9, 19.65),
    ]]
    fillet(fillet2_edges, radius=FILLET2_R)

    # Fillet3
    fillet3_edges = [part.edges().sort_by_distance(p)[0] for p in [
        (35.65, 20, 0),
        (36.235786438, 20, -19.064213562),
        (36.235786438, 20, 19.064213562),
    ]]
    fillet(fillet3_edges, radius=FILLET3_R)


solid = part.part
